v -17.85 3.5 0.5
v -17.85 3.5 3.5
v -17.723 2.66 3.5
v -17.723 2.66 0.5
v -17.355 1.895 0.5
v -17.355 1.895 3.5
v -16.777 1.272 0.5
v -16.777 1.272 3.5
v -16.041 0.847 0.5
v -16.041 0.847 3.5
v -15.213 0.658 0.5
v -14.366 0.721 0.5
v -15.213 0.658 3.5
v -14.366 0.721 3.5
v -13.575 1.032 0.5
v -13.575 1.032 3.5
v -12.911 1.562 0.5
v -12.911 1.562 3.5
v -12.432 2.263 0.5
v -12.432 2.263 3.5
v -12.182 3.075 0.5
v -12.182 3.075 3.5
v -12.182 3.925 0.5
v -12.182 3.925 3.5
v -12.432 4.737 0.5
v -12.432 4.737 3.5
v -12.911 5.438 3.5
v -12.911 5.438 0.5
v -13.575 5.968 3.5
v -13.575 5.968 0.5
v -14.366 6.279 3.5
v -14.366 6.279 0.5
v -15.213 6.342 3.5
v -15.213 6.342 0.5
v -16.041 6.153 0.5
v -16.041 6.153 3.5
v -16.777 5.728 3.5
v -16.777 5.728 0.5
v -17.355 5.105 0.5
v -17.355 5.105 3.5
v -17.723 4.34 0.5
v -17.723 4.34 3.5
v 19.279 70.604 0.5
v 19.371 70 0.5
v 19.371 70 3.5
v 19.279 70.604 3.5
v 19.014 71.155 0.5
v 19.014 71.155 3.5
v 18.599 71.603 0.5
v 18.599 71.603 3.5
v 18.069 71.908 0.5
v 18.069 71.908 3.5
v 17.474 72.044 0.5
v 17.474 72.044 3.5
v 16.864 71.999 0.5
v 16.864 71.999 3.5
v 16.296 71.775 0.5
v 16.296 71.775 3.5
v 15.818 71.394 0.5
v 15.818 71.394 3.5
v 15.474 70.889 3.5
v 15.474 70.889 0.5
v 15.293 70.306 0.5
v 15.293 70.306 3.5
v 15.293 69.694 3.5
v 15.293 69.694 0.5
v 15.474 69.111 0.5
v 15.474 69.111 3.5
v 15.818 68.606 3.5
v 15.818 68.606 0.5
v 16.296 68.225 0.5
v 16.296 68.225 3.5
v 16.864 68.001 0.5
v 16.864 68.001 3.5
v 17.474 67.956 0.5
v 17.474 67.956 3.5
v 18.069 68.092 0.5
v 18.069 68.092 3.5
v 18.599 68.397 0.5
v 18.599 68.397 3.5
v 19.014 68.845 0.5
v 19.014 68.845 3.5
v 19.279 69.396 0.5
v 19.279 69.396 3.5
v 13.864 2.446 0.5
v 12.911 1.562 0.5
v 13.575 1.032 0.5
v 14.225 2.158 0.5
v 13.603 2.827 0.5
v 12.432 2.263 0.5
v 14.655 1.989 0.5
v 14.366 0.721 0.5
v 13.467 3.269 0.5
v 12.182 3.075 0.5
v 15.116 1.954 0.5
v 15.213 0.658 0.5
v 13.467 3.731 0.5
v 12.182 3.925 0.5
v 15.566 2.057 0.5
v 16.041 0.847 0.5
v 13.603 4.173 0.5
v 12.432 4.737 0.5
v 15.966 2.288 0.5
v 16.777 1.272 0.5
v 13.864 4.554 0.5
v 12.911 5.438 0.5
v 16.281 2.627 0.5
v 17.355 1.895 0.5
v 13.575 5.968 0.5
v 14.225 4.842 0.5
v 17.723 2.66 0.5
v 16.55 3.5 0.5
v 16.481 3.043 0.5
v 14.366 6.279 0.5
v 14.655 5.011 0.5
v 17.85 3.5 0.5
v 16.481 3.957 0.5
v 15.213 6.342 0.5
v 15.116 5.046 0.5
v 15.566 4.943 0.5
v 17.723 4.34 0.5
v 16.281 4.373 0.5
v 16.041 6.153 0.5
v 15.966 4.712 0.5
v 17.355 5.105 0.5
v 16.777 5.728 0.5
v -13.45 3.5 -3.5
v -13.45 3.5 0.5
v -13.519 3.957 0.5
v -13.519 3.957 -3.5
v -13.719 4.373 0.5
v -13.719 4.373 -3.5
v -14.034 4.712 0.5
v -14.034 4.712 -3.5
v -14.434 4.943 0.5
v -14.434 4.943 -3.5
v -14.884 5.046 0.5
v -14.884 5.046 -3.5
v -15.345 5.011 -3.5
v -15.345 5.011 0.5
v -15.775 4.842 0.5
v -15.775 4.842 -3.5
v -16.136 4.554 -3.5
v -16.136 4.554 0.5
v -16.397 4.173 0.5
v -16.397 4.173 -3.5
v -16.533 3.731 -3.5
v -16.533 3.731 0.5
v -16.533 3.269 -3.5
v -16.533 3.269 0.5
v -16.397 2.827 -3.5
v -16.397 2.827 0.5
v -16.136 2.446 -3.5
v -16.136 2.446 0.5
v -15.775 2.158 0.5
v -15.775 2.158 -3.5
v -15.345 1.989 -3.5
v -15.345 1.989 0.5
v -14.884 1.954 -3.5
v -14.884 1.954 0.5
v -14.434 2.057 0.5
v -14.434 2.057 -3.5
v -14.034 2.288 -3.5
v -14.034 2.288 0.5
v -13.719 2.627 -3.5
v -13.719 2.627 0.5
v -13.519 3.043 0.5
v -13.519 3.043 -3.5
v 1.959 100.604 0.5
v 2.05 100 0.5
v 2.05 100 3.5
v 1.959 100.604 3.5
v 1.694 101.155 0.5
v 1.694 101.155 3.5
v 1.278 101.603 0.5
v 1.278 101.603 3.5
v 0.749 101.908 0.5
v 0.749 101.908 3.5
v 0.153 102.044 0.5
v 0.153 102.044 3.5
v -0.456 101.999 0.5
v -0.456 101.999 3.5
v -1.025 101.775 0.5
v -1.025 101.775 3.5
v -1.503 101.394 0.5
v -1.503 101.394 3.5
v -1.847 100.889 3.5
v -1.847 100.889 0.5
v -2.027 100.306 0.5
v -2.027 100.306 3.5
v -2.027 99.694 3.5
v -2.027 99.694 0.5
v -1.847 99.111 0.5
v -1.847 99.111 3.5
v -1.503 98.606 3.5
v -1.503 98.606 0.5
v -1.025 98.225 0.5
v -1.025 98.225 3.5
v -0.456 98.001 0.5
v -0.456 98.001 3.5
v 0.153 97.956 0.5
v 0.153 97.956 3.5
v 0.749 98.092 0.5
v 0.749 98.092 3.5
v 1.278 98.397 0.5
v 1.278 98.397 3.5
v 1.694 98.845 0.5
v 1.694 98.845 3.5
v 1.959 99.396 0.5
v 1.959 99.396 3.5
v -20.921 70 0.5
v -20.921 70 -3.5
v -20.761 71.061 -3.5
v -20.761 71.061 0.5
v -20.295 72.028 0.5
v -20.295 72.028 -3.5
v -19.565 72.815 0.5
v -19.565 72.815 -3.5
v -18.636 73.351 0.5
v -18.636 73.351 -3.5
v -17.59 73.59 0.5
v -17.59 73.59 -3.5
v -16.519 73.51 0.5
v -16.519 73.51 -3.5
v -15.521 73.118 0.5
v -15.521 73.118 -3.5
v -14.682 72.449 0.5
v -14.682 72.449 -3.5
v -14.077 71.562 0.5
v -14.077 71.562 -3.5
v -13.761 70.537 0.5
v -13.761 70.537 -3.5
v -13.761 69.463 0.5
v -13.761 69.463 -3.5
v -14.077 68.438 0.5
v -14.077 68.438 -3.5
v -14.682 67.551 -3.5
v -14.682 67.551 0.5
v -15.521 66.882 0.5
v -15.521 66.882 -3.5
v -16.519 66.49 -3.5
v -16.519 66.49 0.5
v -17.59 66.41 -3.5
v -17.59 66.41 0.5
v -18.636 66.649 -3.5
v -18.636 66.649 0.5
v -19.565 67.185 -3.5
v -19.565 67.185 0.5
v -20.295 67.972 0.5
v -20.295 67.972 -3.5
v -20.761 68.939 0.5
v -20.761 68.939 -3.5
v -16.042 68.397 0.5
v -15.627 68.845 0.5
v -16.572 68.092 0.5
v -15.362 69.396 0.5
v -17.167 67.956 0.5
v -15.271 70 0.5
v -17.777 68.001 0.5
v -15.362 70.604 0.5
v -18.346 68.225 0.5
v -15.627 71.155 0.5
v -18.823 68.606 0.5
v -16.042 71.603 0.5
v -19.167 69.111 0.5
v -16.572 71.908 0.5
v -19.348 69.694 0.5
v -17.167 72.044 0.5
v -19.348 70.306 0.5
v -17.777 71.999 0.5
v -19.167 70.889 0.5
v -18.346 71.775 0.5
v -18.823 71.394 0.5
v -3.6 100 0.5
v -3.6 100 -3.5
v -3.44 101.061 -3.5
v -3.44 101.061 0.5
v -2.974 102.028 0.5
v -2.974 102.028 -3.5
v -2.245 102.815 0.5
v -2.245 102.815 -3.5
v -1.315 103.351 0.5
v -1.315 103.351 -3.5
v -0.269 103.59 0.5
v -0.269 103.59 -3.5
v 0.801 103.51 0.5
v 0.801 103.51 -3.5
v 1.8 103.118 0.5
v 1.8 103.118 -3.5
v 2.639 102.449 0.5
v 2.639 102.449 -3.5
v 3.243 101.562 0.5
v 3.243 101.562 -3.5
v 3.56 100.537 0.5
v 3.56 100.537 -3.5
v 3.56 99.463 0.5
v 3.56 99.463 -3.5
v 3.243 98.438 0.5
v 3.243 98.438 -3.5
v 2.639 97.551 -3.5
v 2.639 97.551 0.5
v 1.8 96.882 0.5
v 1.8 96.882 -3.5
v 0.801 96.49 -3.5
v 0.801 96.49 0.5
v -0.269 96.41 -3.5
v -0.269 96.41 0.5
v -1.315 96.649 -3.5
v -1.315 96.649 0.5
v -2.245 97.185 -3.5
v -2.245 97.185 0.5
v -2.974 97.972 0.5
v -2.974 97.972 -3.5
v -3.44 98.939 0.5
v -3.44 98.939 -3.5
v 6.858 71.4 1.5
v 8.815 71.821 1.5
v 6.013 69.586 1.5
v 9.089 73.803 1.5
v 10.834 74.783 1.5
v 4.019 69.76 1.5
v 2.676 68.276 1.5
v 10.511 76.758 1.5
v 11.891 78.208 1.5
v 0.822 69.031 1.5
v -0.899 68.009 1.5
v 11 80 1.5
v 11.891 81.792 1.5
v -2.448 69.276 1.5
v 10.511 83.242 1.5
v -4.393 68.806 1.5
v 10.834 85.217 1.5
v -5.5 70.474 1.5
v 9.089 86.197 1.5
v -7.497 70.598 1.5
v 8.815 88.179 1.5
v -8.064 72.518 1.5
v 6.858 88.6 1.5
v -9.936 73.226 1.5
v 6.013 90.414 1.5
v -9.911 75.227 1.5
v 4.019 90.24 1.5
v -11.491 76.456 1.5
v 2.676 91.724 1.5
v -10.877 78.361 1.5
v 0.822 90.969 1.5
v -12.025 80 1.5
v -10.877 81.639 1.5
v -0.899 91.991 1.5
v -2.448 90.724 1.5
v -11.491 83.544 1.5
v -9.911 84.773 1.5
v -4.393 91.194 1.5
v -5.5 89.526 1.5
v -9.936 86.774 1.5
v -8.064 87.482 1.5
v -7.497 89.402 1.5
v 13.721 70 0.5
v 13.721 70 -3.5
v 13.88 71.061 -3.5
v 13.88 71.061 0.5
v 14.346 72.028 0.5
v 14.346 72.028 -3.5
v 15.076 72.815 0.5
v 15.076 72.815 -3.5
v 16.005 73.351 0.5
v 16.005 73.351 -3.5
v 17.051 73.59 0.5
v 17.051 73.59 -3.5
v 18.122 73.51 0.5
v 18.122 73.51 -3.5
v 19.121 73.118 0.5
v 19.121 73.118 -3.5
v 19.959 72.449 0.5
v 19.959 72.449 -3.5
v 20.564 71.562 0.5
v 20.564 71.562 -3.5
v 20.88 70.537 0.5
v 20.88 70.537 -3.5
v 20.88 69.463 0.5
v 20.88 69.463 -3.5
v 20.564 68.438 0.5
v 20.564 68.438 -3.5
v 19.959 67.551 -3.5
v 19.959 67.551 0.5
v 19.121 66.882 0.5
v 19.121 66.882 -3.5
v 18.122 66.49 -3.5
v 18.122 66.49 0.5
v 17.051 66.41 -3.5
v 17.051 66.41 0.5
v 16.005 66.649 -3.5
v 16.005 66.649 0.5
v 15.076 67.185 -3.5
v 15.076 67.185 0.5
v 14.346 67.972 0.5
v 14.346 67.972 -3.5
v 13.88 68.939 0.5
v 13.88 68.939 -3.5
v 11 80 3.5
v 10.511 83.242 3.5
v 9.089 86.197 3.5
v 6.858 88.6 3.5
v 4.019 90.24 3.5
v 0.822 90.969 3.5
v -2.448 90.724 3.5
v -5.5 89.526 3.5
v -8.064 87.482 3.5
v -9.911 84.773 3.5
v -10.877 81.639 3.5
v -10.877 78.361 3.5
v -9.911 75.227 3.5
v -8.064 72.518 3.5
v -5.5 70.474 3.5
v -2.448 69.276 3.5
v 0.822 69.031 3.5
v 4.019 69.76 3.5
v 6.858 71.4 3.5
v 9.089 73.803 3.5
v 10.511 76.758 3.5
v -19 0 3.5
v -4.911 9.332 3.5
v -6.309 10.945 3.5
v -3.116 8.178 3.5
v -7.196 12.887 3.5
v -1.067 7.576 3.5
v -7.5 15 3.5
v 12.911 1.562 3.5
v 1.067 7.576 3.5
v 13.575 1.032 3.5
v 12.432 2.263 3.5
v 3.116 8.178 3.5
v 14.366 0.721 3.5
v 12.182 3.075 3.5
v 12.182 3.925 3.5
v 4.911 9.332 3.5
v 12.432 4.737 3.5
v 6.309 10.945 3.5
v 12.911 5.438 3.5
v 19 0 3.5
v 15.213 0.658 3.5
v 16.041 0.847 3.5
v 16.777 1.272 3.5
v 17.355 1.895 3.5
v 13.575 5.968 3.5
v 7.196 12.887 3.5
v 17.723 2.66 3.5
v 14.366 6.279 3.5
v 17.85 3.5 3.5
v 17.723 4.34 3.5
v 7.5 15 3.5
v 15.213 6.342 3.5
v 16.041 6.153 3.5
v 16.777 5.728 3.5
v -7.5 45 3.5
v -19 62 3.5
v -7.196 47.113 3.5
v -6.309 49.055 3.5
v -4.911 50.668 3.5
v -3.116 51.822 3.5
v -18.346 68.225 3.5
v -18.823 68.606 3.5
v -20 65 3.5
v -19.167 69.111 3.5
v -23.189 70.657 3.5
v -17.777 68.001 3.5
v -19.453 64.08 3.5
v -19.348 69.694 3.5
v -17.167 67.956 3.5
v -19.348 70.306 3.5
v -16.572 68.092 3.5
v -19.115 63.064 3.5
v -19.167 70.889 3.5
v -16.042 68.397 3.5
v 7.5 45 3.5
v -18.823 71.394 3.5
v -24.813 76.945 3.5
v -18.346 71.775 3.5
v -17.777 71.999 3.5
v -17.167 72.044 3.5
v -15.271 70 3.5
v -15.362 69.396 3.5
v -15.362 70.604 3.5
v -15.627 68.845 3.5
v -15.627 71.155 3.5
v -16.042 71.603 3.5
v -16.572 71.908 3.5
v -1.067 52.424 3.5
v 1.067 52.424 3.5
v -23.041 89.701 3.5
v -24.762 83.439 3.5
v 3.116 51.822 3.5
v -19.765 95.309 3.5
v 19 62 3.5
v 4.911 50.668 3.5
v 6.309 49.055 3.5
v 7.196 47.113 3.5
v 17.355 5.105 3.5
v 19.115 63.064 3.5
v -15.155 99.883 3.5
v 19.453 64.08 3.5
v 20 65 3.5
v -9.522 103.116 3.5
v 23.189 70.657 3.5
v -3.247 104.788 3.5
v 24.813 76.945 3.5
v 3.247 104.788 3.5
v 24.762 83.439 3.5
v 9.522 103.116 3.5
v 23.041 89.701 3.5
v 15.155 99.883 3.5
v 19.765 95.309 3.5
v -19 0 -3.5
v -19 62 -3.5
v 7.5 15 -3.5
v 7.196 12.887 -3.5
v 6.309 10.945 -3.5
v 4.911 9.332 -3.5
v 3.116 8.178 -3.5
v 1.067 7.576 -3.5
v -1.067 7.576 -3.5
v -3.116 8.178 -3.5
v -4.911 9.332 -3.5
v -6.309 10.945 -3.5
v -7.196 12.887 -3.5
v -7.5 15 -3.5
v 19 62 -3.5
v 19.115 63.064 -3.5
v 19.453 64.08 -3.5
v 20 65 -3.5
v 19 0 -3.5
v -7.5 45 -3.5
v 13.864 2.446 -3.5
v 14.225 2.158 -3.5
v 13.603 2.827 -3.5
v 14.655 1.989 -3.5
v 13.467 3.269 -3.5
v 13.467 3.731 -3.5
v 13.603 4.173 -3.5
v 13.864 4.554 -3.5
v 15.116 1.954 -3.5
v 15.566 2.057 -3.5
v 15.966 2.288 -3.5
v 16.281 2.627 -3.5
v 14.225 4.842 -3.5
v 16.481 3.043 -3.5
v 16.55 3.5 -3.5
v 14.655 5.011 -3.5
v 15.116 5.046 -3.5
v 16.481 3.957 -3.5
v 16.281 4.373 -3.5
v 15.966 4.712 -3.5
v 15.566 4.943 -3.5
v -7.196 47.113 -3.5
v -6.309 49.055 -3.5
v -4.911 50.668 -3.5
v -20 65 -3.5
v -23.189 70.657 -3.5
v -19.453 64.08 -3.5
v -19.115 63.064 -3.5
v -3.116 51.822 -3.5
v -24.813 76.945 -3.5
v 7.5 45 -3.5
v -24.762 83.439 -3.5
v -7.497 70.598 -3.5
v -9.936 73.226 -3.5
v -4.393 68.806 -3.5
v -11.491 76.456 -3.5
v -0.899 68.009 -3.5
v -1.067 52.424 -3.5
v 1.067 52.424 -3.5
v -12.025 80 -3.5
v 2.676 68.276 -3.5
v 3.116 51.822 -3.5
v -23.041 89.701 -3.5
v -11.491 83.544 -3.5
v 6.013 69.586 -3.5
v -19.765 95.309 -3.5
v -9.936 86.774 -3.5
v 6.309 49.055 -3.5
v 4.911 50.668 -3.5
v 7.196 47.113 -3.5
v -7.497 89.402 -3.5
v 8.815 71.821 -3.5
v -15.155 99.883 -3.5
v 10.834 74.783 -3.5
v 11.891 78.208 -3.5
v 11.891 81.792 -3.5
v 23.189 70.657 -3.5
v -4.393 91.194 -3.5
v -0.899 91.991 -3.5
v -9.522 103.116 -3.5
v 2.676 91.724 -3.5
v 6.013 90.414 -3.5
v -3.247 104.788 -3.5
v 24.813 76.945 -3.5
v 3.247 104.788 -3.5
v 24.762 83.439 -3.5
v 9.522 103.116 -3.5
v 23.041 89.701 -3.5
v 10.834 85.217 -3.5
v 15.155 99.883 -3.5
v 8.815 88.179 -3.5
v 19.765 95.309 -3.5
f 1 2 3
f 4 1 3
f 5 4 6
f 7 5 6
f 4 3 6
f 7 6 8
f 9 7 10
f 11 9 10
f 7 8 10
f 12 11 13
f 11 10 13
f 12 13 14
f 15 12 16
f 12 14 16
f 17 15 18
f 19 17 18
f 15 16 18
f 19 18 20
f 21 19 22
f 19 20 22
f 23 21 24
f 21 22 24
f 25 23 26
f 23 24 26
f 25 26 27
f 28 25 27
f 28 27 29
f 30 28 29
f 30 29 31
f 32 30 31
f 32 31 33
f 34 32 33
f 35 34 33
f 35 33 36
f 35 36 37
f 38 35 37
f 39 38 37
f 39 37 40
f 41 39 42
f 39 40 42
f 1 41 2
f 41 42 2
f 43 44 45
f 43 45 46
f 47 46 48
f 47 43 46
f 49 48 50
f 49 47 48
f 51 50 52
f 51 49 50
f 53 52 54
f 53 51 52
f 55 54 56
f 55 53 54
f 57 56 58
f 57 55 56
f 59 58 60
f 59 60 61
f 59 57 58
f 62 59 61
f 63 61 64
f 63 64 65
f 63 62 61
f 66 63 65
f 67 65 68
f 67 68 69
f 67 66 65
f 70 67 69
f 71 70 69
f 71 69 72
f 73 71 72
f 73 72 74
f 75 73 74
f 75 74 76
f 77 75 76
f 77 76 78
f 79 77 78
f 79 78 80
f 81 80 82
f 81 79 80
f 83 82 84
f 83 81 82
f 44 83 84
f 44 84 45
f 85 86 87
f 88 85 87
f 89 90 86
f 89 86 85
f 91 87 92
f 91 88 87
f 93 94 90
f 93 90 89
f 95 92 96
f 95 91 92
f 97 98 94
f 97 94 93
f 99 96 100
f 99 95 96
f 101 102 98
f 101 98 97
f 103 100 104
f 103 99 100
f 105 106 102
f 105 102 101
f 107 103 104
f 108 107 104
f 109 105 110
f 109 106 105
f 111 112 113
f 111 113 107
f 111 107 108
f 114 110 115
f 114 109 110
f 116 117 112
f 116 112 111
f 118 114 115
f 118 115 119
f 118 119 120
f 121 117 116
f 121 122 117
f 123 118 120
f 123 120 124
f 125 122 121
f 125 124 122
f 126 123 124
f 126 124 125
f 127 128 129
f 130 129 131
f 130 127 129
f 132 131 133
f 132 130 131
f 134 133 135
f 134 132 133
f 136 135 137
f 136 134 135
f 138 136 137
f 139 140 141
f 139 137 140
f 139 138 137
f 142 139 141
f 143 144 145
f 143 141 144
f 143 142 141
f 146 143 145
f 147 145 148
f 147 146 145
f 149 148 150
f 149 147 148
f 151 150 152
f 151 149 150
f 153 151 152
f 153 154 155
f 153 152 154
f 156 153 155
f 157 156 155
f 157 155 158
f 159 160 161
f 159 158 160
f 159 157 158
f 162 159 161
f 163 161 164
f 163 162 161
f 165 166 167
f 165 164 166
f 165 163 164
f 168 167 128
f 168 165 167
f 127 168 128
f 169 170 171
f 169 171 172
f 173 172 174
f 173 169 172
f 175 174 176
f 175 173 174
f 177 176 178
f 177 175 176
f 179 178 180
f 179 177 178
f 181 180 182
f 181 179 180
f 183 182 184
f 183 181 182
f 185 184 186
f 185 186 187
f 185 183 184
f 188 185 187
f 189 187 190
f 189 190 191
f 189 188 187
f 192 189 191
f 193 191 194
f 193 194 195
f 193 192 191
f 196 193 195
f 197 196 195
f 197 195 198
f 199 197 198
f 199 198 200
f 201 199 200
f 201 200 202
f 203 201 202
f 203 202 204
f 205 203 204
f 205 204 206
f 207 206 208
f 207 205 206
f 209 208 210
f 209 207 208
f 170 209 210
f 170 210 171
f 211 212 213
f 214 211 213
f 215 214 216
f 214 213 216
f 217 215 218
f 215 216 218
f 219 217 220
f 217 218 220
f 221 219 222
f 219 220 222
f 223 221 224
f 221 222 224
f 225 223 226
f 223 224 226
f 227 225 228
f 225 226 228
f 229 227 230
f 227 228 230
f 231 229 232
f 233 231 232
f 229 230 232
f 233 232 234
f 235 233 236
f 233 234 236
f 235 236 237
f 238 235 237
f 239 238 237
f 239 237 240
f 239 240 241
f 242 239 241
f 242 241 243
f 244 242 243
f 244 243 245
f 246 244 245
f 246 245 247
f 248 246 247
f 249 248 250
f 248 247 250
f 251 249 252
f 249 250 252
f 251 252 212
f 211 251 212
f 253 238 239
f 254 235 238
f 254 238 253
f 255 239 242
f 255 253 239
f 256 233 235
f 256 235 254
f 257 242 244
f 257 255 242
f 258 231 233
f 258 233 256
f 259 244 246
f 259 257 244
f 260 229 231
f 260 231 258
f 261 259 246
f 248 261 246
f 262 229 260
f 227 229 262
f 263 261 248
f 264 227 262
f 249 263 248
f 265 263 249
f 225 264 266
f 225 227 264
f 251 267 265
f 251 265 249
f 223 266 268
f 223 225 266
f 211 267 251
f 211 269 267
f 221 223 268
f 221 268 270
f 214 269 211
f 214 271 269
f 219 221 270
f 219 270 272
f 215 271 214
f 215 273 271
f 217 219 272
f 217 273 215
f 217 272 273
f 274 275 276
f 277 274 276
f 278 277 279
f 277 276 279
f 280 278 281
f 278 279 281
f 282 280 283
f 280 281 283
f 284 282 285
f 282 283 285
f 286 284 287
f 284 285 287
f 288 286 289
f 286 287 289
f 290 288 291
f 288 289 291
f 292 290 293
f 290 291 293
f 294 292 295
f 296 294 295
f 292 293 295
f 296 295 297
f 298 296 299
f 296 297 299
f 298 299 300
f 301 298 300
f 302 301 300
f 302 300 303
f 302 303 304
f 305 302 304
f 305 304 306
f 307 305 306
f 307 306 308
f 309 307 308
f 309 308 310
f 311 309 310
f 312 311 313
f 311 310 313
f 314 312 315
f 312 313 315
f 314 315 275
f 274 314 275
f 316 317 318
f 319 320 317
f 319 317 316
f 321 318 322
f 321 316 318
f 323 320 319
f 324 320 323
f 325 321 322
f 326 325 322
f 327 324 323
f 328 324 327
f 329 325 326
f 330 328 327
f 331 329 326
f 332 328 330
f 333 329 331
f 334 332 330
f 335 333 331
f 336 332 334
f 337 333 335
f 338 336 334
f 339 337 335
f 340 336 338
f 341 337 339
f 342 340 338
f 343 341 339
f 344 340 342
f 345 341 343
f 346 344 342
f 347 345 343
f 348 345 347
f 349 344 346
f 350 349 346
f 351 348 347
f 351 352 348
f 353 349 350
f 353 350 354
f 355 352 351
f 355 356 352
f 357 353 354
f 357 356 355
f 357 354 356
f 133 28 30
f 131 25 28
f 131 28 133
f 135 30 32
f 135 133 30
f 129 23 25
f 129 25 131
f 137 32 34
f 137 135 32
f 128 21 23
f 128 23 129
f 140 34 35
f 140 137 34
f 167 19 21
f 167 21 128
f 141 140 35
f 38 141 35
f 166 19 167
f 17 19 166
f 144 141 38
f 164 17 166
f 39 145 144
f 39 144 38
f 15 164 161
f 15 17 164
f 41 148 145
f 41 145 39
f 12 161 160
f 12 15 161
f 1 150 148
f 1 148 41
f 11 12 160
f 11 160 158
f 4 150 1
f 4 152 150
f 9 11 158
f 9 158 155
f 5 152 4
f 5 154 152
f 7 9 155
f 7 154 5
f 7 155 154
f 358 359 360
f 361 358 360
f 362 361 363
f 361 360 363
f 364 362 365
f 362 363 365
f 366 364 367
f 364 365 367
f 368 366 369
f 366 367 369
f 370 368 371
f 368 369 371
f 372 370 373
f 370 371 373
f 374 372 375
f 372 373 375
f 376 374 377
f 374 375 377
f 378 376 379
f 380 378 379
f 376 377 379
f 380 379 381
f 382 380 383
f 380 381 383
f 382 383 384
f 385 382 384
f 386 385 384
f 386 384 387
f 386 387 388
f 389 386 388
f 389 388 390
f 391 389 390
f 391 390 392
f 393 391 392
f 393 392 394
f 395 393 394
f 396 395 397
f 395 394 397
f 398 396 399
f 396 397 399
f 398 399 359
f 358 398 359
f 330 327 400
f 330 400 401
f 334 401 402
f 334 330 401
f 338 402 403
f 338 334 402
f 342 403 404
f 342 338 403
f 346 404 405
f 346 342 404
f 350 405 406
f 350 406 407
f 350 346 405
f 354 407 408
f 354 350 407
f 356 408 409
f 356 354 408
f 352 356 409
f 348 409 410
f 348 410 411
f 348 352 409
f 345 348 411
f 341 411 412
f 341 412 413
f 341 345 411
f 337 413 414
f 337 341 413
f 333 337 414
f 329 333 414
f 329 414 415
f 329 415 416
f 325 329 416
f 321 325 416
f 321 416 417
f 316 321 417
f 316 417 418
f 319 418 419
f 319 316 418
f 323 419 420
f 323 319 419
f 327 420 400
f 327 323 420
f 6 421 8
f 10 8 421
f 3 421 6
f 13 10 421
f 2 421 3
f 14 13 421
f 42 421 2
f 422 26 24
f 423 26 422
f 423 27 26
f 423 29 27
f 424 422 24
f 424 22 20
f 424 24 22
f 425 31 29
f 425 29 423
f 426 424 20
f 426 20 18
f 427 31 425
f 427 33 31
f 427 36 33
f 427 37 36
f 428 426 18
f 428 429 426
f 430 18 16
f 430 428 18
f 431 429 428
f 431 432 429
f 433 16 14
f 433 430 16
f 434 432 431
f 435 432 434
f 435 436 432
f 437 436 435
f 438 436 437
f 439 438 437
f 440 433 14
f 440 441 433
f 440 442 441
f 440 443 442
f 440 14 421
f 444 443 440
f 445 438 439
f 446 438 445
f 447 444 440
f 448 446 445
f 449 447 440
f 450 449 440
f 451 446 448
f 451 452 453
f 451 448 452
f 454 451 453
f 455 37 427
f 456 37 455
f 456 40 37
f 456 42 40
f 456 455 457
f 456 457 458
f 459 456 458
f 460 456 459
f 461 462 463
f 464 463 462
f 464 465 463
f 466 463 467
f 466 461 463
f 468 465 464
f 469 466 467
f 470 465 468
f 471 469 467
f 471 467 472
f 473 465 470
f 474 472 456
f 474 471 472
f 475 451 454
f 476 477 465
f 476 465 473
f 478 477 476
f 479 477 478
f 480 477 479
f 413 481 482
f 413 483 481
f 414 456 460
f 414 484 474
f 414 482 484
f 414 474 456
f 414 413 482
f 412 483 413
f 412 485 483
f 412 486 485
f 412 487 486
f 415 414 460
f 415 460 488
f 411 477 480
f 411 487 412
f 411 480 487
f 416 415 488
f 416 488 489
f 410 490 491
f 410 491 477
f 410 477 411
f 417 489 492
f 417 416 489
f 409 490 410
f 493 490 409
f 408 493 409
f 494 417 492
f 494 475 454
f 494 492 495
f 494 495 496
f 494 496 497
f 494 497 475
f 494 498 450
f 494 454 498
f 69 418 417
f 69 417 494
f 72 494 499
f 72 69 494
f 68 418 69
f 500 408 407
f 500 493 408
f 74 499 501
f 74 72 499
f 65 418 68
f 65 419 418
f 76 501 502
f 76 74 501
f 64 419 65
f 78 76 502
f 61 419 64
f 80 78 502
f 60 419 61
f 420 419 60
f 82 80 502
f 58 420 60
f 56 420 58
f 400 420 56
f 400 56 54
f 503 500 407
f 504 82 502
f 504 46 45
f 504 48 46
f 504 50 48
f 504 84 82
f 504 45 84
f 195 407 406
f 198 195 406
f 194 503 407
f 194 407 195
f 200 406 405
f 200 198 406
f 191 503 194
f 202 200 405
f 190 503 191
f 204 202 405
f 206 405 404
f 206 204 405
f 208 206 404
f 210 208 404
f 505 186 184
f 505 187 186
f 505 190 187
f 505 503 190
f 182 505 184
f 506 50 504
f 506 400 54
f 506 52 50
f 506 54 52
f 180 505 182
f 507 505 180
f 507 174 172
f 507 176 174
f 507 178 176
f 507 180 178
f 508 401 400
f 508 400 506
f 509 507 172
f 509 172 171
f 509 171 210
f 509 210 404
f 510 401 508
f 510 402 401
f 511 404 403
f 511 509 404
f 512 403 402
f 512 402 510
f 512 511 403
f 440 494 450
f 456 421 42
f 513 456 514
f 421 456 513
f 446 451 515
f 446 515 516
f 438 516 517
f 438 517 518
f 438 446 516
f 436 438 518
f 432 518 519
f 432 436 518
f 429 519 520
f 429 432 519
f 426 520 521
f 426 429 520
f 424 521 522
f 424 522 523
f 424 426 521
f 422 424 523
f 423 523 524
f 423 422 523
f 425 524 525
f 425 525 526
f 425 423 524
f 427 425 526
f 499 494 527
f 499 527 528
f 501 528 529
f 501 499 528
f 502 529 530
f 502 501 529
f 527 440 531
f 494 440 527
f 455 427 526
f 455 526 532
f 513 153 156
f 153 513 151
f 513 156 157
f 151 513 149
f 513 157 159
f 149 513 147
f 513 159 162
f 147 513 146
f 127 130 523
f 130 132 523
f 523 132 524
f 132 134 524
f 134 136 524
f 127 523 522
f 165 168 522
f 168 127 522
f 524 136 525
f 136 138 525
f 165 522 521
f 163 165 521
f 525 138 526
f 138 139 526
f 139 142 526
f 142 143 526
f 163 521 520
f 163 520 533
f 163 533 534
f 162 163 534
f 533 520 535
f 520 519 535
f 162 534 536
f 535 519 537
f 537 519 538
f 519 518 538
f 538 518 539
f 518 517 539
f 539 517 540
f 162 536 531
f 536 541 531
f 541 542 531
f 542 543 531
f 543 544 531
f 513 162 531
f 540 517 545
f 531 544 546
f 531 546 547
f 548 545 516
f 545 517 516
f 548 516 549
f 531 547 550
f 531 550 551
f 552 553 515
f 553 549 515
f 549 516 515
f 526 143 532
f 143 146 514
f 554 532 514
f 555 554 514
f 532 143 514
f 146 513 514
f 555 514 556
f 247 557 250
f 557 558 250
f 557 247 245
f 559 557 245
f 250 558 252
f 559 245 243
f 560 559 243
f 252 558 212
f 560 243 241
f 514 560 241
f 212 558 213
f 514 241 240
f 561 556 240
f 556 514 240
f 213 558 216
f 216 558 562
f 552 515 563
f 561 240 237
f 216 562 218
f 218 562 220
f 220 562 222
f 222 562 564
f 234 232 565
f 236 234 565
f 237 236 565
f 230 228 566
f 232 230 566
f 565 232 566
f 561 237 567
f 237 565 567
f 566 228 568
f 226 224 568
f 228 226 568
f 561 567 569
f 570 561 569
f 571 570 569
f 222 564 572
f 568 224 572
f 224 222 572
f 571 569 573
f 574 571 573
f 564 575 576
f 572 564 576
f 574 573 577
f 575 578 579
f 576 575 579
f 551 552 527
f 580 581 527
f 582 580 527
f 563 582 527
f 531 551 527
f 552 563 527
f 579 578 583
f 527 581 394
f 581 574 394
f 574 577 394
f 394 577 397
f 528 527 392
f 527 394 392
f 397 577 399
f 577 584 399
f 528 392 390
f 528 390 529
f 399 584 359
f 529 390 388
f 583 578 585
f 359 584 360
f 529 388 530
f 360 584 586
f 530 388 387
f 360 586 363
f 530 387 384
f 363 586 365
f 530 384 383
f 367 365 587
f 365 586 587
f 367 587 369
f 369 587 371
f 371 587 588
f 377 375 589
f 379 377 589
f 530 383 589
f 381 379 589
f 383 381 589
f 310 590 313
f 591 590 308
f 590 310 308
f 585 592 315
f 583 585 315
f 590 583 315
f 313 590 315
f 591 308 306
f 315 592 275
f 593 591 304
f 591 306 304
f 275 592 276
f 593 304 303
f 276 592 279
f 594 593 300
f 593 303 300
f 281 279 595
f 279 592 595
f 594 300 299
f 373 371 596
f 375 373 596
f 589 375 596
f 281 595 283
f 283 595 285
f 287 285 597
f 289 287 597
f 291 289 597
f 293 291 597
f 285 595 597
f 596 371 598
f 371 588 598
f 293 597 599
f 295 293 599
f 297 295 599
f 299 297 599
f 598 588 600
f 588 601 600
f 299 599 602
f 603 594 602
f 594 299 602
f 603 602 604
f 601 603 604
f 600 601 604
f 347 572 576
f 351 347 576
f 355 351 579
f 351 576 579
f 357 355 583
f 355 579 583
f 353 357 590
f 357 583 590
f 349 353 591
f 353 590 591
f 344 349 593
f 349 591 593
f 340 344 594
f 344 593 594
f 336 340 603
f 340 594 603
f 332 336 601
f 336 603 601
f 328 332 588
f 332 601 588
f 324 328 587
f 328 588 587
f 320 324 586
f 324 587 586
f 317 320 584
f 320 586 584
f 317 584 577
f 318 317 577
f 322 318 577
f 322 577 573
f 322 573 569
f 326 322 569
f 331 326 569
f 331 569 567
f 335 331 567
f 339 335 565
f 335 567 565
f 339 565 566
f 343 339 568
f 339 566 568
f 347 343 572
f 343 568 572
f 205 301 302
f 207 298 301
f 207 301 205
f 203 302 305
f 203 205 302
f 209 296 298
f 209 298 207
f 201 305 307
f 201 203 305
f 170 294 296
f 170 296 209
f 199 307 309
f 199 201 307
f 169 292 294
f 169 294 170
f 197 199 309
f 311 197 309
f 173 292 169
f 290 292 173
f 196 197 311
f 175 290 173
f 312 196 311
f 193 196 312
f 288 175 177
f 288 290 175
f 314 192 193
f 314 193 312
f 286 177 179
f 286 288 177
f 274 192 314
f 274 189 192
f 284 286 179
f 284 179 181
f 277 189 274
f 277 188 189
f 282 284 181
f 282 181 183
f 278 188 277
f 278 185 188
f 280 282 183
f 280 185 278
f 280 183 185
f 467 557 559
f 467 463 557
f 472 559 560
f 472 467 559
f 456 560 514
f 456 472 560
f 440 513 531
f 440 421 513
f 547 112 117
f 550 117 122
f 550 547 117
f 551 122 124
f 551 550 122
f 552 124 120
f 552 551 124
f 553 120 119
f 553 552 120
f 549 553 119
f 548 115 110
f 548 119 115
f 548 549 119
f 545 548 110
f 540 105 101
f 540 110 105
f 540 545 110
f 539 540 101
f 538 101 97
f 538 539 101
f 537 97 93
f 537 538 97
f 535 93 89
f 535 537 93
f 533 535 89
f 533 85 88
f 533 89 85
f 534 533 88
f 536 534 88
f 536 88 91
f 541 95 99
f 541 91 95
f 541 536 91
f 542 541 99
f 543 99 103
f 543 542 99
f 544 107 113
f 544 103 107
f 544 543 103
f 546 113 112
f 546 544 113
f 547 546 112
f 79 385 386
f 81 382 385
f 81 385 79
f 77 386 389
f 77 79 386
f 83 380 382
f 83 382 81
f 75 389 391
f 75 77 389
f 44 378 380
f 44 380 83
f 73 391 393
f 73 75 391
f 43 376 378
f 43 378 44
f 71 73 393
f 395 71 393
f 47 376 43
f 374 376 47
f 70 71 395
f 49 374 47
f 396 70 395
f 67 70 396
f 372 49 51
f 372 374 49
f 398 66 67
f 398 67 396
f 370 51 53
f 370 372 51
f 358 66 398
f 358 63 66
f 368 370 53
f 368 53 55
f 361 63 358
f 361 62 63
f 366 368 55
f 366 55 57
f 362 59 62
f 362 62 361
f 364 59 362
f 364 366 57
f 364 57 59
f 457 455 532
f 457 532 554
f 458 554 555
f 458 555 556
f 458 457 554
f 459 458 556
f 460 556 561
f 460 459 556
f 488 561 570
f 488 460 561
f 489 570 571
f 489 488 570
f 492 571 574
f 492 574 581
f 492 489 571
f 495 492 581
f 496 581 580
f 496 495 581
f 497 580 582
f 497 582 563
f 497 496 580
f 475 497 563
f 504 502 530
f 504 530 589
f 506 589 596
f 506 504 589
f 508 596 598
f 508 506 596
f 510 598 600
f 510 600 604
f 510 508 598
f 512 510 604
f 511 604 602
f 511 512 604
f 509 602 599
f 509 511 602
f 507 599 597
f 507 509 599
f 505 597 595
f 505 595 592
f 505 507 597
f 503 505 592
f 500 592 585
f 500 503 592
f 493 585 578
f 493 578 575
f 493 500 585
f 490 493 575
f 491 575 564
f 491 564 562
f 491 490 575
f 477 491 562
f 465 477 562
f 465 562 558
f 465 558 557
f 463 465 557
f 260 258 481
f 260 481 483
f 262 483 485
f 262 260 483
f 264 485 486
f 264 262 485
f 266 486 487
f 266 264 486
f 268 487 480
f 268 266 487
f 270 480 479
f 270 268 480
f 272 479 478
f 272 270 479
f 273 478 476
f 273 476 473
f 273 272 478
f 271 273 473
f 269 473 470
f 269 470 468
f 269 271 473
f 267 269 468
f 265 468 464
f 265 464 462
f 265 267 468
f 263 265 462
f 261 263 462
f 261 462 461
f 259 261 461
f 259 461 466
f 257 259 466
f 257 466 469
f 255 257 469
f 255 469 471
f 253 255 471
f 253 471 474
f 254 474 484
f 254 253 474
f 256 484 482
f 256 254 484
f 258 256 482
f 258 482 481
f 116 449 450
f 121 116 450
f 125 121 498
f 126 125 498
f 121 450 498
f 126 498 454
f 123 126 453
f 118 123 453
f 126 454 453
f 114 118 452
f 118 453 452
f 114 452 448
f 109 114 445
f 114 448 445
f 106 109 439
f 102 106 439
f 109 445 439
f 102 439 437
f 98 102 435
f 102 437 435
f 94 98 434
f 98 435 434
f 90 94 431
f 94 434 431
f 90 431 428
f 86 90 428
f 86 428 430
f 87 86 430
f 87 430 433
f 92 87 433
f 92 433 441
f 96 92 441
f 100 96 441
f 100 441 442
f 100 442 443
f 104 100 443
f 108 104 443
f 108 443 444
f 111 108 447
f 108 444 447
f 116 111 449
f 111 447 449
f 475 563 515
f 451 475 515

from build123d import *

# Parameters (mm, degrees)
SKETCH_1_R         = 1.55
SKETCH_1_R_2       = 2.05
SKETCH_1_R_3       = 11
EXTRUDE_1_DEPTH    = 3.5
SKETCH1_R          = 12.025
CUT_EXTRUDE2_DEPTH = 5
SKETCH2_R          = 2.85
CUT_EXTRUDE3_DEPTH = 3
SKETCH3_R          = 3.6
CUT_EXTRUDE4_DEPTH = 4


with BuildPart() as part:
    # 草图1 → 凸台-拉伸1 (new, symmetric)
    with BuildSketch(Plane.XY):
        with BuildLine():
            Line((-19, 0), (19, 0))
            Line((19, 0), (19, 62))
            ThreePointArc((19, 62), (19.25658351, 63.58113883), (20, 65))
            ThreePointArc((20, 65), (0, 105), (-20, 65))
            ThreePointArc((-20, 65), (-19.25658351, 63.58113883), (-19, 62))
            Line((-19, 62), (-19, 0))
        make_face()
        with BuildLine():
            ThreePointArc((-7.5, 45), (0, 52.5), (7.5, 45))
            Line((7.5, 45), (7.5, 15))
            ThreePointArc((7.5, 15), (0, 7.5), (-7.5, 15))
            Line((-7.5, 15), (-7.5, 45))
        make_face(mode=Mode.SUBTRACT)
        with Locations((-15, 3.5)):
            Circle(SKETCH_1_R, mode=Mode.SUBTRACT)
        with Locations((15, 3.5)):
            Circle(SKETCH_1_R, mode=Mode.SUBTRACT)
        with Locations((0, 100)):
            Circle(SKETCH_1_R_2, mode=Mode.SUBTRACT)
        with Locations((-17.320508076, 70)):
            Circle(SKETCH_1_R_2, mode=Mode.SUBTRACT)
        with Locations((0, 80)):
            Circle(SKETCH_1_R_3, mode=Mode.SUBTRACT)
        with Locations((17.320508076, 70)):
            Circle(SKETCH_1_R_2, mode=Mode.SUBTRACT)
    extrude(amount=EXTRUDE_1_DEPTH, both=True)

    # Sketch1 → Cut-Extrude2 (cut)
    with BuildSketch(Plane(origin=(0, 0, -3.5), x_dir=(-1, 0, 0), z_dir=(0, 0, -1))):
        with Locations((0, 80)):
            Circle(SKETCH1_R)
    extrude(amount=-CUT_EXTRUDE2_DEPTH, mode=Mode.SUBTRACT)

    # Sketch2 → Cut-Extrude3 (cut)
    with BuildSketch(Plane.XY.offset(3.5)):
        with Locations((15, 3.5)):
            Circle(SKETCH2_R)
        with Locations(Location((-15, 3.5, 0), (0, 0, 180))):
            Circle(SKETCH2_R)
    extrude(amount=-CUT_EXTRUDE3_DEPTH, mode=Mode.SUBTRACT)

    # Sketch3 → Cut-Extrude4 (cut)
    with BuildSketch(Plane(origin=(0, 0, -3.5), x_dir=(-1, 0, 0), z_dir=(0, 0, -1))):
        with Locations((0, 100)):
            Circle(SKETCH3_R)
        with Locations((17.320508076, 70)):
            Circle(SKETCH3_R)
        with Locations((-17.320508076, 70)):
            Circle(SKETCH3_R)
    extrude(amount=-CUT_EXTRUDE4_DEPTH, mode=Mode.SUBTRACT)


solid = part.part
